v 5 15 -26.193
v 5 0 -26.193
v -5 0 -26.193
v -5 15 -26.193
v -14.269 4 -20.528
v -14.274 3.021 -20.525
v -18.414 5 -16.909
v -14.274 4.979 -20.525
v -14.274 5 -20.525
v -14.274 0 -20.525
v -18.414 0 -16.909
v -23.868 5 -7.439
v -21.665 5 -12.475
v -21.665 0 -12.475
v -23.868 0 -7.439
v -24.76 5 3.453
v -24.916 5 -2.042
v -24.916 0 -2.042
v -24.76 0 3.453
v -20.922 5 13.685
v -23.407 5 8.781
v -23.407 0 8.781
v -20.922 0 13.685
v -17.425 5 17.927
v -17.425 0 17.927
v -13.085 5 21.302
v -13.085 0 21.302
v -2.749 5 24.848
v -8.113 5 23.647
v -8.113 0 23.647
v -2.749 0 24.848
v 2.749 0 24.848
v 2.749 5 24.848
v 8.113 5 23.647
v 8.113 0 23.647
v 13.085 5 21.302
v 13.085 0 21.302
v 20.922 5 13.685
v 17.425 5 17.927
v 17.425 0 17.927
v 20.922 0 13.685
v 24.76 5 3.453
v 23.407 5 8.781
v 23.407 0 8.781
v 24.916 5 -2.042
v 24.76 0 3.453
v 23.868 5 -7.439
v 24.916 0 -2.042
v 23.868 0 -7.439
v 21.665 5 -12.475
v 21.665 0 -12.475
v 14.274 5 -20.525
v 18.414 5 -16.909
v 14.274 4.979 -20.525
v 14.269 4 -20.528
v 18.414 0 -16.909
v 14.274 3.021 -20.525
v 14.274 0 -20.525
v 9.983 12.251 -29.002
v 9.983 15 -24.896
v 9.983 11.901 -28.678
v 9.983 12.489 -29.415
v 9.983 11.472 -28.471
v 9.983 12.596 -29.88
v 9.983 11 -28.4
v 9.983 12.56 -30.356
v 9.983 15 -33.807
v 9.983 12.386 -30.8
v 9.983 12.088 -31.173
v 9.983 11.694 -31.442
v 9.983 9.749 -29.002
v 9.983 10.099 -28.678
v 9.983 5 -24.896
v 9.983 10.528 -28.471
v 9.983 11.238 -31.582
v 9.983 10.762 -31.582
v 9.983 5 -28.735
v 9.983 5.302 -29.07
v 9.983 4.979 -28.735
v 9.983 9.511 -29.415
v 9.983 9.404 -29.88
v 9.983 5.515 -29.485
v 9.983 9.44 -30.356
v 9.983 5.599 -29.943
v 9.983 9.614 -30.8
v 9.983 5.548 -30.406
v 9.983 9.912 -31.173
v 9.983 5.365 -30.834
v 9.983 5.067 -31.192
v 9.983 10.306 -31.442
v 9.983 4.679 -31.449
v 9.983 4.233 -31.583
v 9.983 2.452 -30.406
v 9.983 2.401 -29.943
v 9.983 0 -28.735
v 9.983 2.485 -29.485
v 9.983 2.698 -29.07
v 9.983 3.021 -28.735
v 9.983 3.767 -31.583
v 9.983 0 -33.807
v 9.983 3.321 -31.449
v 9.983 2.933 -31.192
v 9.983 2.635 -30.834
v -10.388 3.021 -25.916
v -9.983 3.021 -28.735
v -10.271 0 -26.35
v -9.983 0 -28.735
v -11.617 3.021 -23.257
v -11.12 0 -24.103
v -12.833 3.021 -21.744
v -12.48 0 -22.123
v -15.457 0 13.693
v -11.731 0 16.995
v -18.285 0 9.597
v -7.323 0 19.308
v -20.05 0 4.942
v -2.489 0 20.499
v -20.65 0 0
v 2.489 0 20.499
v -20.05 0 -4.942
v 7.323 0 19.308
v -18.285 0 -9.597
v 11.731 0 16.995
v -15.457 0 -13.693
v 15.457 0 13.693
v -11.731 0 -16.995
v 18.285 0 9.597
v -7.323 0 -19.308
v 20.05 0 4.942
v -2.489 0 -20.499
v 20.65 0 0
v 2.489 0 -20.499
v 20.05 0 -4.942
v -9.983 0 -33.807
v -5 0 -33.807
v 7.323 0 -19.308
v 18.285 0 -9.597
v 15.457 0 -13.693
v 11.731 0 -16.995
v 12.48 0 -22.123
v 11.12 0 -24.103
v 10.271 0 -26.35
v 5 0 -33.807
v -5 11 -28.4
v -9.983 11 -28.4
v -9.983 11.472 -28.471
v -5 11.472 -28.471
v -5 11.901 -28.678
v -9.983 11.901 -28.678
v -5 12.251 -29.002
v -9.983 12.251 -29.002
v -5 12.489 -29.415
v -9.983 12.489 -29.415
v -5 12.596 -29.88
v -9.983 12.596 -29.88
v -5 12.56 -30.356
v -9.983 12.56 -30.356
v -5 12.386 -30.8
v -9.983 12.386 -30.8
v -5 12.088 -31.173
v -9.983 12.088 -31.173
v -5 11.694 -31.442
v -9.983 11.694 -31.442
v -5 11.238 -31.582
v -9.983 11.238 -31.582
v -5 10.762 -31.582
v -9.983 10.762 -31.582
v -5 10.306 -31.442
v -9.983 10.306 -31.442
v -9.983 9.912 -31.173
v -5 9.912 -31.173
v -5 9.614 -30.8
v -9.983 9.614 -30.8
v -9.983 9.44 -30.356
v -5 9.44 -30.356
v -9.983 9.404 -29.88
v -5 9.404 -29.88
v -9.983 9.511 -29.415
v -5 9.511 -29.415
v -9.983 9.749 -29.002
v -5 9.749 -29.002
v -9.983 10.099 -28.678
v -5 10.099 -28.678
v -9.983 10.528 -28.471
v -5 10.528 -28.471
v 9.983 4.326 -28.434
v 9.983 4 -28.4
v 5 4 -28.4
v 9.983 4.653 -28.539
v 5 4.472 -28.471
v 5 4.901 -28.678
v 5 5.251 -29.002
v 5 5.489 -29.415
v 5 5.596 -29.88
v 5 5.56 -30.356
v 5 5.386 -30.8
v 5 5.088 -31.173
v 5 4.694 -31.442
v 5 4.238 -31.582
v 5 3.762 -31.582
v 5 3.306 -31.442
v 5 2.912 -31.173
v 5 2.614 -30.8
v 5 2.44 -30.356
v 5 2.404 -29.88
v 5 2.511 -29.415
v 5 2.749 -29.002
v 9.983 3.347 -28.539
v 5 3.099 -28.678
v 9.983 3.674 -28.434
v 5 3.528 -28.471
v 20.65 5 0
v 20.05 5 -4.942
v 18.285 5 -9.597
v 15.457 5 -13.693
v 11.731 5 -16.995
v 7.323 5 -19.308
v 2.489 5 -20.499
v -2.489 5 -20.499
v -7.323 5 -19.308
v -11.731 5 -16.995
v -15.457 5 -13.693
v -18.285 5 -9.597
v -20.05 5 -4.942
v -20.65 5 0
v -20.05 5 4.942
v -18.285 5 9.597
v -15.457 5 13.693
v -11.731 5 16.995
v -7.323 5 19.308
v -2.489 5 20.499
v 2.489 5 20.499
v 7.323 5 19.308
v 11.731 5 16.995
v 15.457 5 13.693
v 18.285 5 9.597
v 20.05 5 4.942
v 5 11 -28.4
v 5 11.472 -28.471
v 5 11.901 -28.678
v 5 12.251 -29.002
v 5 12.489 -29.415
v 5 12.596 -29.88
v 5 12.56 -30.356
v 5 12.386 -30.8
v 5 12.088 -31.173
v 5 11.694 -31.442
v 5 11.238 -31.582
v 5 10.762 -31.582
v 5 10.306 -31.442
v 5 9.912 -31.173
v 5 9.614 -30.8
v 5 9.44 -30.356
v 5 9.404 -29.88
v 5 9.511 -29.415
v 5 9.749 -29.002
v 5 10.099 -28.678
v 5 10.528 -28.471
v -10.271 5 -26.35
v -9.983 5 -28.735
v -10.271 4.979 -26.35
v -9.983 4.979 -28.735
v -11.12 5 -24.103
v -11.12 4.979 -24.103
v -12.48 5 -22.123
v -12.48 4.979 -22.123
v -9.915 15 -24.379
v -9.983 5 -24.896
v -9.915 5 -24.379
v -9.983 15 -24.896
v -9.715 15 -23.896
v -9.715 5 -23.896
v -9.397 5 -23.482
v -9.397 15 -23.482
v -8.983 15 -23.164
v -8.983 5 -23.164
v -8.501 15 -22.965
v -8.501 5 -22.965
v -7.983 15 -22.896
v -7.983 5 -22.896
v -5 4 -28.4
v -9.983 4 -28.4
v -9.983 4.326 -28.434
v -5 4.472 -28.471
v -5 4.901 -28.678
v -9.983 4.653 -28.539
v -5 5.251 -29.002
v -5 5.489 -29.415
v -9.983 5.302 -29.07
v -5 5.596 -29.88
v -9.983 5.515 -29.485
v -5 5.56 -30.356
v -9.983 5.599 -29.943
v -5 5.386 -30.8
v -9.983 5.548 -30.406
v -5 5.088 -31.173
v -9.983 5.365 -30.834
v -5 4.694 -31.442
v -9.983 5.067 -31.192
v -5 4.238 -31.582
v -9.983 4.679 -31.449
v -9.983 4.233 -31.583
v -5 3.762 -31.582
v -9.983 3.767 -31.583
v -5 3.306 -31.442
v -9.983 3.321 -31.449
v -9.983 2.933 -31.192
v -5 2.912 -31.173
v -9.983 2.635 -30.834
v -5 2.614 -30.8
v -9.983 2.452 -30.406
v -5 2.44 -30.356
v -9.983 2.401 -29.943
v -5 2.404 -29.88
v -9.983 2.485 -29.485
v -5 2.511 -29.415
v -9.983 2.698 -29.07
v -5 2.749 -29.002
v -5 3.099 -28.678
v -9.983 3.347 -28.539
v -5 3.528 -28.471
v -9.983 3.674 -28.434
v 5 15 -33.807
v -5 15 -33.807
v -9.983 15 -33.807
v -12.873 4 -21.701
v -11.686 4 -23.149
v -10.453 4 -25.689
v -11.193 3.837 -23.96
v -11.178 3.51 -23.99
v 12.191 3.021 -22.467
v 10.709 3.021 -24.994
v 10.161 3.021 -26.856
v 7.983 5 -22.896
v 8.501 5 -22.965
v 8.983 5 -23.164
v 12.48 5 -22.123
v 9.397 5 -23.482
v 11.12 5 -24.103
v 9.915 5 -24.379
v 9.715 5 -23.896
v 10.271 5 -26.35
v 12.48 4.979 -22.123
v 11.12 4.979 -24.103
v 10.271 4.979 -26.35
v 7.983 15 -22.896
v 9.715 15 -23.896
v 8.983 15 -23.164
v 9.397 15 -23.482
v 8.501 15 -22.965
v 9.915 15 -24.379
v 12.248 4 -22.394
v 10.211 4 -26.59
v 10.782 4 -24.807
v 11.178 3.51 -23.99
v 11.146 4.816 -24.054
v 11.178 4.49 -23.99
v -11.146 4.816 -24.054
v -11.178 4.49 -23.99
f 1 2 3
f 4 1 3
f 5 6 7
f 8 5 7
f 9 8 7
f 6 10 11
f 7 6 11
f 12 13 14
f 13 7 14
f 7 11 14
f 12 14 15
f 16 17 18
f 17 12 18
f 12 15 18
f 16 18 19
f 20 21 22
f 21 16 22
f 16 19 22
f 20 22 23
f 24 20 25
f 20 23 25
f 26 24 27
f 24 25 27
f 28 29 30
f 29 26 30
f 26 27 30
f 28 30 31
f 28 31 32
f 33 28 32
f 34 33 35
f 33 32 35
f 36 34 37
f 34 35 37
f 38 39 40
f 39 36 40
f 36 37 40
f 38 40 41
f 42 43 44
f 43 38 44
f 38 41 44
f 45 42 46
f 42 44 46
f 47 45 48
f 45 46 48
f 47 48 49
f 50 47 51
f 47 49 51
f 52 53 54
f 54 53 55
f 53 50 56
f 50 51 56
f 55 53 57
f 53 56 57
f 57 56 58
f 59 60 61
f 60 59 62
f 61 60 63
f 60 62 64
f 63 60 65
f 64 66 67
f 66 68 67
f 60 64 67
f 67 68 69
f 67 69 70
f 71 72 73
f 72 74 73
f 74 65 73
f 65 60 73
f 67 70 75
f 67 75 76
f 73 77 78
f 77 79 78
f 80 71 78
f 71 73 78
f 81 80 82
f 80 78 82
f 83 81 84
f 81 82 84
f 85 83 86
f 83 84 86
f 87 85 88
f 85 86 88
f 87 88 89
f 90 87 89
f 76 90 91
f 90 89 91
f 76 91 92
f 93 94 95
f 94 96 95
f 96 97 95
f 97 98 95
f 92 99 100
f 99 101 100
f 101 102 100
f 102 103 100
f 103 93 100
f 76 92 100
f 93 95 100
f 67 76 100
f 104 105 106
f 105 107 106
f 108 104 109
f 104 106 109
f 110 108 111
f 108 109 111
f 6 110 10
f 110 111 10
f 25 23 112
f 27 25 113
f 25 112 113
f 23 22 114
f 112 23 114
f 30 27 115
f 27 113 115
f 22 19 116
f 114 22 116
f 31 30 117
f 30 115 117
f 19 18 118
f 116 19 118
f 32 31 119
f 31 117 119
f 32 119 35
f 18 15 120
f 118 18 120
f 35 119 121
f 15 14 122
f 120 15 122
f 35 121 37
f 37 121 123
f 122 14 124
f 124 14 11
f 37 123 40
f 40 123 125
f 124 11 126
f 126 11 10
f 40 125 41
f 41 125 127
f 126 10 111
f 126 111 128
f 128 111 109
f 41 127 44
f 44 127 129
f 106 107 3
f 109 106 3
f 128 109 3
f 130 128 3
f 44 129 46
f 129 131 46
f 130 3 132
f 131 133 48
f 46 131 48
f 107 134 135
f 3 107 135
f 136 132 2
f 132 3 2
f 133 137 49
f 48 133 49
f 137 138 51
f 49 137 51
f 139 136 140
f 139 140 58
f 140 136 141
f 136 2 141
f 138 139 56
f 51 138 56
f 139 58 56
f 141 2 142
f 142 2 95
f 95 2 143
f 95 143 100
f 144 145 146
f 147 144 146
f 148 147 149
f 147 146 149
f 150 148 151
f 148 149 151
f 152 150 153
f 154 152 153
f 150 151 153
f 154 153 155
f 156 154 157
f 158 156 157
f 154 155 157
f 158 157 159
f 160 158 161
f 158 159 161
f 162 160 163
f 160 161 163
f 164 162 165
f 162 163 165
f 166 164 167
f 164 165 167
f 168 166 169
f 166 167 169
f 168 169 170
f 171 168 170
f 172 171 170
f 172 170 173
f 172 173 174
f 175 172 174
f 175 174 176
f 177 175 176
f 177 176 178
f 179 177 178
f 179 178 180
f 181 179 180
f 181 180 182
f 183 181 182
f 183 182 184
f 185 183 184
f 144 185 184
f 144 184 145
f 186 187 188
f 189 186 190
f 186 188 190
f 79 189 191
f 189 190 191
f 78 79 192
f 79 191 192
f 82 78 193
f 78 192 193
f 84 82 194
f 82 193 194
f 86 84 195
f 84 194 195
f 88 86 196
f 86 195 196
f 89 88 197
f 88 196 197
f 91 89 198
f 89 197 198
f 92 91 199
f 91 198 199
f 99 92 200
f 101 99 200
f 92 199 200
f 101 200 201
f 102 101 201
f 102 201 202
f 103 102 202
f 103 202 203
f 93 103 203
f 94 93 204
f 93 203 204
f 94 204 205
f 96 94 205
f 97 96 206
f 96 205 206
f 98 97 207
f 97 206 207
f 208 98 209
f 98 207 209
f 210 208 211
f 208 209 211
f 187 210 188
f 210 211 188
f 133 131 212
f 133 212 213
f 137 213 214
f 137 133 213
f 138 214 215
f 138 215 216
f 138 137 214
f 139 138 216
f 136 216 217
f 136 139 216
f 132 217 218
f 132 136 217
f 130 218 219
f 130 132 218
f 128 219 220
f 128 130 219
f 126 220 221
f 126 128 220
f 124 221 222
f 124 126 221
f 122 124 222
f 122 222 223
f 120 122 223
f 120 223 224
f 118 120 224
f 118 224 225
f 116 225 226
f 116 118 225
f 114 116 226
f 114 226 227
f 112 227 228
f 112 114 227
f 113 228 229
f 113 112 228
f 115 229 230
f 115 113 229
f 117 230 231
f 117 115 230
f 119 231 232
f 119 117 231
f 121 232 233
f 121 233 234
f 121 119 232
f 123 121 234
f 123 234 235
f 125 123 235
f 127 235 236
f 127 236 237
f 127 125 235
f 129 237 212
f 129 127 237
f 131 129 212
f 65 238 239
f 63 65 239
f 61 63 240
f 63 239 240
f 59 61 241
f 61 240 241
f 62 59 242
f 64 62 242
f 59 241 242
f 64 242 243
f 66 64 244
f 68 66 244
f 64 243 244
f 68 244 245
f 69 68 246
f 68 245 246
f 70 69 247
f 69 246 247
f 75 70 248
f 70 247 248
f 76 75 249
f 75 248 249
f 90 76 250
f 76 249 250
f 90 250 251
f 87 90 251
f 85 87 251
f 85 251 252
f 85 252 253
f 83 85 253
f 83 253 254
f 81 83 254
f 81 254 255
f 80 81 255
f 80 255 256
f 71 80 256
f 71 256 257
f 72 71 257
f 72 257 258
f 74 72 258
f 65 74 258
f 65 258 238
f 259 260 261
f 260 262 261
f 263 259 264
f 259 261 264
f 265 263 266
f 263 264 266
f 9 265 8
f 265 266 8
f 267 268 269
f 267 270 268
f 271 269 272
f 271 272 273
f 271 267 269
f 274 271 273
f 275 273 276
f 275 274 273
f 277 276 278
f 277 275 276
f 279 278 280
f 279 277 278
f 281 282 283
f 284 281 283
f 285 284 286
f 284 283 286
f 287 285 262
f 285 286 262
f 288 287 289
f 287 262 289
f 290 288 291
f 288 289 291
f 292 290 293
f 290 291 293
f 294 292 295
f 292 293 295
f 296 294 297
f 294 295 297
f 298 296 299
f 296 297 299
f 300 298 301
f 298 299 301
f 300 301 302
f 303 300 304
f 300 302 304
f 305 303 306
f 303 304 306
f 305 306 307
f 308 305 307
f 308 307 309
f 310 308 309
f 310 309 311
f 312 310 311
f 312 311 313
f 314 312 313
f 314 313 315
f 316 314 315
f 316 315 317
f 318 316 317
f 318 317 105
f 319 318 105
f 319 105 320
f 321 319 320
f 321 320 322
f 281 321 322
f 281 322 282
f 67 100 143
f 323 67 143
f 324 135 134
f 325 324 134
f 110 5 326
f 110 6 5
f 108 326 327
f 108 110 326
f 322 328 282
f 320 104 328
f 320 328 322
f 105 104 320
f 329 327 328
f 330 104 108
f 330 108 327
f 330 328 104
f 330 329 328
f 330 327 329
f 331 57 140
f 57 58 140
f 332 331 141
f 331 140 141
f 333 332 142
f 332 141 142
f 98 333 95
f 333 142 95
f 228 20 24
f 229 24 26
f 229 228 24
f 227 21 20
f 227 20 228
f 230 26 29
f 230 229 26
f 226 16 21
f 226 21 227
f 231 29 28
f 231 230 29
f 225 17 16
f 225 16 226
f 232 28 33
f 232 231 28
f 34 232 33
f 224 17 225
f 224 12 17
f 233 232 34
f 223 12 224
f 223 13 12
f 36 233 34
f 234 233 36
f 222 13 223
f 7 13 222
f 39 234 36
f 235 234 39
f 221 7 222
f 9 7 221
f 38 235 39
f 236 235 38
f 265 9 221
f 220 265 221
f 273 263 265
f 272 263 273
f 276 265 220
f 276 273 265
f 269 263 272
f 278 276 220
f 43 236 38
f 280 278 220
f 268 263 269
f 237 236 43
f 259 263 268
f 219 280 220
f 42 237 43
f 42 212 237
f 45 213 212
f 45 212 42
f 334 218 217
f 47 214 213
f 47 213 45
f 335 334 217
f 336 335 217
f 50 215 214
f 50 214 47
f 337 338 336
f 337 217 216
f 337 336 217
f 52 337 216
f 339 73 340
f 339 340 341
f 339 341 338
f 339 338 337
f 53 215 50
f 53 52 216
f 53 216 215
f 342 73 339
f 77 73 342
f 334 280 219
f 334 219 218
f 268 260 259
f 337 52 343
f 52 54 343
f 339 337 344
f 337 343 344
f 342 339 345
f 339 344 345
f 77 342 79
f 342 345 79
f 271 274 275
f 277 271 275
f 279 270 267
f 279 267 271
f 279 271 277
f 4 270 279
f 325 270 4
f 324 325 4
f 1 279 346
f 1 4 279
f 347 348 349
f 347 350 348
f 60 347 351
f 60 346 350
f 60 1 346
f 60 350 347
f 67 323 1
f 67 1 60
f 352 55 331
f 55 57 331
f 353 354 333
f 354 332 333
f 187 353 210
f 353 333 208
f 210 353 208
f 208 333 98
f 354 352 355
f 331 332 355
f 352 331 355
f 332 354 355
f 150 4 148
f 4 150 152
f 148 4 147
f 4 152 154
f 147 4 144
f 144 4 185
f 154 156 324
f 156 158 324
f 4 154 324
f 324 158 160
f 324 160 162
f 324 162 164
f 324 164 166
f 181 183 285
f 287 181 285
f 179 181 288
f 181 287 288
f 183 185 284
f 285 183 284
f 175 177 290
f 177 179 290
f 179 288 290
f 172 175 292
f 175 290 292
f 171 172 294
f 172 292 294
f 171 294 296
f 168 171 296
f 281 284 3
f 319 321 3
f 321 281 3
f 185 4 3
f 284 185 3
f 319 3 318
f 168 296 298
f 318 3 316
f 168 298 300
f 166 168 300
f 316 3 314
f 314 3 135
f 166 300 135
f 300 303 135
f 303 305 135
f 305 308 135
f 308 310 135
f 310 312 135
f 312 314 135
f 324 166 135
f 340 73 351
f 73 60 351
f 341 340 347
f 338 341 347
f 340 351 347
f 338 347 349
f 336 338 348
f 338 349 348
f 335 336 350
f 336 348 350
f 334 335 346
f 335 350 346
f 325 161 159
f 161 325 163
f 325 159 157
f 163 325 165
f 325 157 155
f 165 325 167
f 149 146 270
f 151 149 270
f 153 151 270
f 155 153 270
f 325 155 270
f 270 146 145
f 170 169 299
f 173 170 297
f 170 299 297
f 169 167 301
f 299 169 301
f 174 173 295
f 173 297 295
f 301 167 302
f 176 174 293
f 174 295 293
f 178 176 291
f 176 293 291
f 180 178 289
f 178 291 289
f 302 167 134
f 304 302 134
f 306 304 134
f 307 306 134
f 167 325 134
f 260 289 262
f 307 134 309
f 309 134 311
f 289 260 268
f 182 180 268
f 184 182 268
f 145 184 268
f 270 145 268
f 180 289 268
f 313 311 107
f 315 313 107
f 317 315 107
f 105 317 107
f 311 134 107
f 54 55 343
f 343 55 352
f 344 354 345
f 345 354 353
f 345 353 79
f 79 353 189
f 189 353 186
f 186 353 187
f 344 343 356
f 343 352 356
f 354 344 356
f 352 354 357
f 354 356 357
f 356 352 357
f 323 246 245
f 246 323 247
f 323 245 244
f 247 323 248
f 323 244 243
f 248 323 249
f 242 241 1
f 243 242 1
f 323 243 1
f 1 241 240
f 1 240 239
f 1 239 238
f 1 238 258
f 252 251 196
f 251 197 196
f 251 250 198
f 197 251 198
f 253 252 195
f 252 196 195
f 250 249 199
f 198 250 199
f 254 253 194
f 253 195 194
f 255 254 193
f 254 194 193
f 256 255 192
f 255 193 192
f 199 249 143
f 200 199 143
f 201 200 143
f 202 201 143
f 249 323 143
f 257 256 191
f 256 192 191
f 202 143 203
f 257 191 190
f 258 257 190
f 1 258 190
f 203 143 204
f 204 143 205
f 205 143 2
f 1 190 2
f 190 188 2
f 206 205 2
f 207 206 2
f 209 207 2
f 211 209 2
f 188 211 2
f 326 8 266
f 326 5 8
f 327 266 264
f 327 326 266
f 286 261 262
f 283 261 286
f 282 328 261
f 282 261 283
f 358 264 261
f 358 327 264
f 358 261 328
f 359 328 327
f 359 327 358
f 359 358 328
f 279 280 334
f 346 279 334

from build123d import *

# Parameters (mm, degrees)
SKETCH_1_R          = 25
SKETCH_1_R_2        = 20.65
EXTRUDE_1_DEPTH     = 5
EXTRUDE_2_DEPTH     = 15
SKETCH_3_R          = 1.6
CUT_EXTRUDE_1_DEPTH = 35.982946782
FILLET_1_R          = 10
FILLET_2_R          = 2


with BuildPart() as part:
    # 草图1 → 凸台-拉伸1 (new body)
    with BuildSketch(Plane(origin=(0, 0, 0), x_dir=(1, 0, 0), z_dir=(0, 1, 0))):
        Circle(SKETCH_1_R)
        Circle(SKETCH_1_R_2, mode=Mode.SUBTRACT)
    extrude(amount=EXTRUDE_1_DEPTH)

    # 草图2 → 凸台-拉伸2 (add)
    with BuildSketch(Plane(origin=(0, 0, 0), x_dir=(1, 0, 0), z_dir=(0, 1, 0))):
        Polygon((-5, 33.807000777), (-9.982946782, 33.807000777), (-9.982946782, 22.896387671), (9.982946782, 22.896387671), (9.982946782, 33.807000777), (5, 33.807000777), (5, 26.192999223), (-5, 26.192999223), align=None)
    extrude(amount=EXTRUDE_2_DEPTH)

    # 草图3 → 切除-拉伸1 (cut, through all)
    with BuildSketch(Plane.ZY.offset(9.982946782)):
        with Locations((-30, 4)):
            Circle(SKETCH_3_R)
        with Locations((-30, 11)):
            Circle(SKETCH_3_R)
    extrude(amount=-CUT_EXTRUDE_1_DEPTH, mode=Mode.SUBTRACT)

    # 圆角1
    fillet_1_edges = [part.edges().sort_by_distance(p)[0] for p in [
        (9.982946782, 2.5, -22.920313557),
        (-9.982946782, 2.5, -22.920313557),
    ]]
    fillet(fillet_1_edges, radius=FILLET_1_R)

    # 圆角2
    fillet_2_edges = [part.edges().sort_by_distance(p)[0] for p in [
        (-9.982946782, 10, -22.896387671),
        (9.982946782, 10, -22.896387671),
    ]]
    fillet(fillet_2_edges, radius=FILLET_2_R)


solid = part.part
